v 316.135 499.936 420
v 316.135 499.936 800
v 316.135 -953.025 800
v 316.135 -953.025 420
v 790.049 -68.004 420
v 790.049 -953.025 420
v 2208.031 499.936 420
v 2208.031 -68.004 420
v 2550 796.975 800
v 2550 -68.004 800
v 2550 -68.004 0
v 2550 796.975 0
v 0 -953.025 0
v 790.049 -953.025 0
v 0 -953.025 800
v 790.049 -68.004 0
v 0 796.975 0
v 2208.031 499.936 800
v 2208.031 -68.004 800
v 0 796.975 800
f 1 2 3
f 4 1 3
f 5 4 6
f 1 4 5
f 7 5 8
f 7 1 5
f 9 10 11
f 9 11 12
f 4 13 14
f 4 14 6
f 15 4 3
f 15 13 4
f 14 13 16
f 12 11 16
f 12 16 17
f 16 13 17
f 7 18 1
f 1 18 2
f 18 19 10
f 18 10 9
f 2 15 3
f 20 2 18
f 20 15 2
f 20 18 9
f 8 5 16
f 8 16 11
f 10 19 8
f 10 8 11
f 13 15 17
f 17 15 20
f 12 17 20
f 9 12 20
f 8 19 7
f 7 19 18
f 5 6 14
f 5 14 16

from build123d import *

# Parameters (mm, degrees)
F0_W     = 1750
F0_H     = 800
F1_DEPTH = 2550
F2_W     = 1759.9512815475
F2_H     = 885.021125094
F3_DEPTH = 940
F5_DEPTH = 380


with BuildPart() as f1:
    # F0 (on Right) → F1 (new body)
    with BuildSketch(Plane.YZ):
        with Locations((-78.0253756204, 400)):
            Rectangle(F0_W, F0_H)
    extrude(amount=F1_DEPTH)

    # F2 (on face) → F3 (cut)
    with BuildSketch(Plane.XY.offset(800)):
        with Locations((1670.0243592262, -510.5148130734)):
            Rectangle(F2_W, F2_H)
    extrude(amount=-F3_DEPTH, mode=Mode.SUBTRACT)

    # F4 (on face) → F5 (cut)
    with BuildSketch(Plane.XY.offset(800)):
        Polygon((2208.0314159393, -68.0042505264), (2208.0314159393, 499.9359548092), (790.0487184525, 499.9359548092), (316.1346912384, 499.9359548092), (316.1346912384, -953.0253756204), (790.0487184525, -953.0253756204), (790.0487184525, -68.0042505264), align=None)
    extrude(amount=-F5_DEPTH, mode=Mode.SUBTRACT)


solid = f1.part
